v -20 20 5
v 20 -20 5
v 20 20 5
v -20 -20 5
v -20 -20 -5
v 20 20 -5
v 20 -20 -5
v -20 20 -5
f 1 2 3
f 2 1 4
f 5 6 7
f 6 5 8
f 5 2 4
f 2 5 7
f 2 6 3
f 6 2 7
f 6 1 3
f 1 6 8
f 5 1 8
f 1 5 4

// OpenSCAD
// Template for a new parametric part.
// Units: mm. Keep all design inputs at the top.

/* [Dimensions] */
part_width  = 40;
part_depth  = 40;
part_height = 10;

/* [Print] */
layer_height = 0.20;
wall_count   = 3;

$fn = 64;

module part() {
    cube([part_width, part_depth, part_height], center = true);
}

part();
